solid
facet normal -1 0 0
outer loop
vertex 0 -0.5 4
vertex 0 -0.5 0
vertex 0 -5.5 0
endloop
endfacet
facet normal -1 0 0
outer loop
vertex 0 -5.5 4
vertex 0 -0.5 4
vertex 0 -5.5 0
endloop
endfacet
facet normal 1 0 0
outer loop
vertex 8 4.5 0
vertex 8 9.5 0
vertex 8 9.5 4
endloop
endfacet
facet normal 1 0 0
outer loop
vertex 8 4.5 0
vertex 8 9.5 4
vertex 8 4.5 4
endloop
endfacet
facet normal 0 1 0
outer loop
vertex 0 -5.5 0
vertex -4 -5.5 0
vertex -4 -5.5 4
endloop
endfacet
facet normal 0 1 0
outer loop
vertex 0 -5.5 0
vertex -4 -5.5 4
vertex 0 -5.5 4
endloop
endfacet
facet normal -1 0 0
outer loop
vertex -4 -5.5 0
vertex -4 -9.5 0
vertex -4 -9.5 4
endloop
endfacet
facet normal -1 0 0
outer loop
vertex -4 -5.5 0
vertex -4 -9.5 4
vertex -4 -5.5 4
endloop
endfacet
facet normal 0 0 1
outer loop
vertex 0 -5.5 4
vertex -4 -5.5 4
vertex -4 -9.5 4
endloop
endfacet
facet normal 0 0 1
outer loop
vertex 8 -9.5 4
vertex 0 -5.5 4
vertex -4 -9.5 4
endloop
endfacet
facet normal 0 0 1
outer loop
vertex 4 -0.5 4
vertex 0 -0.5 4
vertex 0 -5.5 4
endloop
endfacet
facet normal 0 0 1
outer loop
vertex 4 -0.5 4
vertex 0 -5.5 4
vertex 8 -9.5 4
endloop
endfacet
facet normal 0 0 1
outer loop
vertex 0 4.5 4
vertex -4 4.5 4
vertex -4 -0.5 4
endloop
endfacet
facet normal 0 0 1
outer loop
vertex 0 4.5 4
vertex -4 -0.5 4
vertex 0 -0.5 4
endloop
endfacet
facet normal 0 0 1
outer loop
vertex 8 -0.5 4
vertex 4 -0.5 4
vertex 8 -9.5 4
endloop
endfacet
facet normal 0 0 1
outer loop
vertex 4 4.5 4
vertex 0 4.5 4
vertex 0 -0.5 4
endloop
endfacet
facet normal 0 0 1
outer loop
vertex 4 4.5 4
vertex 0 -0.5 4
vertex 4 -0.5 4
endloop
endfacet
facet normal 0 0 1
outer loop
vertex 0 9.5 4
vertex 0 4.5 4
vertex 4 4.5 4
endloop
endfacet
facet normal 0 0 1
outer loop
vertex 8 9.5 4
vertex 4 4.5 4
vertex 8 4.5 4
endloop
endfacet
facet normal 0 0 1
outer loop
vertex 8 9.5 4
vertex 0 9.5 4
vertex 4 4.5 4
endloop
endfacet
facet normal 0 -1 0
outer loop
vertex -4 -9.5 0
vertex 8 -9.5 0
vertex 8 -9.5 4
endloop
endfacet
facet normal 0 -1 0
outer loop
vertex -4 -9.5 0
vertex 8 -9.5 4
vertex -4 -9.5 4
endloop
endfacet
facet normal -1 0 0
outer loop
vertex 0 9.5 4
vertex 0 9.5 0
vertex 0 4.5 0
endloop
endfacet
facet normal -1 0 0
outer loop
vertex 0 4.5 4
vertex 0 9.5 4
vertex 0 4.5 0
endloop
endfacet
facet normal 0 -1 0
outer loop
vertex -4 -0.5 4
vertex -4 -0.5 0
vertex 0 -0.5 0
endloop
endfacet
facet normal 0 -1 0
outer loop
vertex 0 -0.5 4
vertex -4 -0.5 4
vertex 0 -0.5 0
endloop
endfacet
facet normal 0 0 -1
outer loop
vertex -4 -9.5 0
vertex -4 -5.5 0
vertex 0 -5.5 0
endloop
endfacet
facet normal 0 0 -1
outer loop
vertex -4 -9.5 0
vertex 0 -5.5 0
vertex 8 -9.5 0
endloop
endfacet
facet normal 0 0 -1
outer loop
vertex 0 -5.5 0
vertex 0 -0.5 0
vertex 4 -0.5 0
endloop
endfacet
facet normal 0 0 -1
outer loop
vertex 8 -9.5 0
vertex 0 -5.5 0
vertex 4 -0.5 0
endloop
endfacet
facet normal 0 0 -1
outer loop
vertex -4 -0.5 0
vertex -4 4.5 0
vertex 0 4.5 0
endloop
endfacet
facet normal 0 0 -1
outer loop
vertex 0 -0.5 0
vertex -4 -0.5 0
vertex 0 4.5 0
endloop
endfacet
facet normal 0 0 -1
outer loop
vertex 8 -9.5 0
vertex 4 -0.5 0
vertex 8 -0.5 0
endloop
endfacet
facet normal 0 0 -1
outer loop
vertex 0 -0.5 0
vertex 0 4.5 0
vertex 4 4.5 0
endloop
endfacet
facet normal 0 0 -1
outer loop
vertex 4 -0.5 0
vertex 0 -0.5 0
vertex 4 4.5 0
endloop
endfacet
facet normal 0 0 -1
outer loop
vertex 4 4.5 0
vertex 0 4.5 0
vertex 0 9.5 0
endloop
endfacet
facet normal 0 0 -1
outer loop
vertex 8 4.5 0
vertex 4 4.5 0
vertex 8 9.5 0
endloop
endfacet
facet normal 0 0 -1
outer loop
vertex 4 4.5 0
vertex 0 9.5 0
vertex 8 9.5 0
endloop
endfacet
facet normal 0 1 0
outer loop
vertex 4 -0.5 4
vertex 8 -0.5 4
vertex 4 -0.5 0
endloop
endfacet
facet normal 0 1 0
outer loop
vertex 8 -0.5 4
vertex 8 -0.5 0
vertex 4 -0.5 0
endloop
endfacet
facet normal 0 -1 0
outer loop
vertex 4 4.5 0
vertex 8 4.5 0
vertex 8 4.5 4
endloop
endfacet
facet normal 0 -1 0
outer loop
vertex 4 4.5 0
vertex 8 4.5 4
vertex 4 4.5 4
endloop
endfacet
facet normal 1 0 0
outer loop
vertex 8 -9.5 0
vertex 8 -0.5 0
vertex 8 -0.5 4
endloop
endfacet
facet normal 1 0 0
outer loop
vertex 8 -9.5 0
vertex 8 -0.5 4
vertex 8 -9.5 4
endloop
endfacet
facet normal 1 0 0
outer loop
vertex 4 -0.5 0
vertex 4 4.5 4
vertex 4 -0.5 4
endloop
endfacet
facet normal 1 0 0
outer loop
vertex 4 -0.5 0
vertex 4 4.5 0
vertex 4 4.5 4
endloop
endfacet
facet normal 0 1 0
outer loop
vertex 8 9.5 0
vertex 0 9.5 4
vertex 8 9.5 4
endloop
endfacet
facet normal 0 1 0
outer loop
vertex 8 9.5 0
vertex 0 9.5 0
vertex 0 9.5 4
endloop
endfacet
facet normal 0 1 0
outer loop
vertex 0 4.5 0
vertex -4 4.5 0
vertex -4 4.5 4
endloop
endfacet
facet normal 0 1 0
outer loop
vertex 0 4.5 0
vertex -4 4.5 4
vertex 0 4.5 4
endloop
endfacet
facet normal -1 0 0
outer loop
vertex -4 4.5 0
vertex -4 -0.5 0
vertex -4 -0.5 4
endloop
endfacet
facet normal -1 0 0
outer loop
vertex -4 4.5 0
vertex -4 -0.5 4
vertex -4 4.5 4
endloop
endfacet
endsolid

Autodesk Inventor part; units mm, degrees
ref_plane "YZ Plane" through (0, 0, 0) normal (1, 0, 0) x (0, 1, 0)
ref_plane "XZ Plane" through (0, 0, 0) normal (0, 1, 0) x (-1, 0, 0)
ref_plane "XY Plane" through (0, 0, 0) normal (0, 0, 1) x (1, 0, 0)
sketch "Sketch1" plane through (0, 0, 0) normal (0, 0, 1) x (1, 0, 0)
  line L0 (-4, 9.5) -> (4, 9.5)
  line L1 (4, 9.5) -> (4, -9.5)
  line L2 (4, -9.5) -> (-4, -9.5)
  line L3 (-4, -9.5) -> (-4, 9.5)
  line L4 (-4, 9.5) -> (4, -9.5) construction
  line L5 (4, 9.5) -> (-4, -9.5) construction
  line L6 (4, 9.5) -> (8, 9.5)
  line L7 (8, 9.5) -> (8, 4.5)
  line L8 (8, 4.5) -> (4, 4.5)
  line L9 (4, 4.5) -> (4, 9.5)
  line L10 (8, -0.5) -> (4, -0.5)
  line L11 (8, 4.5) -> (8, -0.5)
  line L12 (8, -5.5) -> (4, -5.5)
  line L13 (8, -0.5) -> (8, -5.5)
  line L14 (2, 14.112) -> (2, 5.4586)
  line L15 (0, 9.5) -> (0, -9.5)
  line L16 (0, 9.5) -> (-4, 9.5)
  line L17 (-4, 9.5) -> (-4, 4.5)
  line L18 (-4, 4.5) -> (0, 4.5)
  line L19 (-4, -0.5) -> (0, -0.5)
  line L20 (-4, 4.5) -> (-4, -0.5)
  line L21 (-4, -0.5) -> (-4, -9.5)
  line L22 (-4, -5.5) -> (0, -5.5)
  line L23 (4, -5.5) -> (8, -5.5)
  line L24 (8, -5.5) -> (8, -9.5)
  line L25 (8, -9.5) -> (4, -9.5)
  line L26 (4, -9.5) -> (4, -5.5)
  point P0 (0, 0)
  point P1 (0, 4.5)
  point P2 (-4, 4.5)
  point P3 (-4, -0.5)
  point P4 (4, -7)
  point P5 (8, -0.5)
  point P6 (0, 9.5)
  point P7 (8, 4.5)
  point P8 (4, -5.5)
  point P9 (0, -5.5)
  point P10 (-4, -5.5)
  dimension "d0" = 8
  dimension "d1" = 19
  dimension "d2" = 4
  dimension "d3" = 5
  dimension "d6" = 5
  dimension "d11" = 12
  dimension "d12" = 6
extrude "Extrusion1" add sketch "Sketch1" along normal blind 4 contours L0 L1 L2 L15 | L18 L15 L19 L3 | L6 L7 L8 L1 | L22 L15 L2 L3 | L10 L13 L12 L1 | L12 L24 L25 L1
sketch "Sketch2" plane through (0, 0, 4) normal (0, 0, 1) x (1, 0, 0)
  line L0 (0, -5.5) -> (-4, -5.5) projected
  line L1 (-4, -5.5) -> (-4, -9.5) projected
  line L2 (-4, -9.5) -> (8, -9.5) projected
  line L3 (8, -9.5) -> (8, -0.5) projected
  line L4 (8, -0.5) -> (4, -0.5) projected
  line L5 (4, -0.5) -> (4, 4.5) projected
  line L6 (4, 4.5) -> (8, 4.5) projected
  line L7 (8, 4.5) -> (8, 9.5) projected
  line L8 (8, 9.5) -> (0, 9.5) projected
  line L9 (0, 9.5) -> (0, 4.5) projected
  line L10 (0, 4.5) -> (-4, 4.5) projected
  line L11 (-4, 4.5) -> (-4, -0.5) projected
  line L12 (-4, -0.5) -> (0, -0.5) projected
  line L13 (0, -0.5) -> (0, -5.5) projected
  point P0 (0, 0)
equation "\"d1\" = height + e"
equation "\"d2\" = e"
equation "\"d3\" = 0.333333 * height"
equation "\"d6\" = d3"
equation "\"d12\" = 0.5 * d11"
equation "\"d13\" = e"
equation "\"e\" = 4"
equation "\"height\" = 15"
properties part number "wall2" material "MDF Medium Density Fiberboard"
